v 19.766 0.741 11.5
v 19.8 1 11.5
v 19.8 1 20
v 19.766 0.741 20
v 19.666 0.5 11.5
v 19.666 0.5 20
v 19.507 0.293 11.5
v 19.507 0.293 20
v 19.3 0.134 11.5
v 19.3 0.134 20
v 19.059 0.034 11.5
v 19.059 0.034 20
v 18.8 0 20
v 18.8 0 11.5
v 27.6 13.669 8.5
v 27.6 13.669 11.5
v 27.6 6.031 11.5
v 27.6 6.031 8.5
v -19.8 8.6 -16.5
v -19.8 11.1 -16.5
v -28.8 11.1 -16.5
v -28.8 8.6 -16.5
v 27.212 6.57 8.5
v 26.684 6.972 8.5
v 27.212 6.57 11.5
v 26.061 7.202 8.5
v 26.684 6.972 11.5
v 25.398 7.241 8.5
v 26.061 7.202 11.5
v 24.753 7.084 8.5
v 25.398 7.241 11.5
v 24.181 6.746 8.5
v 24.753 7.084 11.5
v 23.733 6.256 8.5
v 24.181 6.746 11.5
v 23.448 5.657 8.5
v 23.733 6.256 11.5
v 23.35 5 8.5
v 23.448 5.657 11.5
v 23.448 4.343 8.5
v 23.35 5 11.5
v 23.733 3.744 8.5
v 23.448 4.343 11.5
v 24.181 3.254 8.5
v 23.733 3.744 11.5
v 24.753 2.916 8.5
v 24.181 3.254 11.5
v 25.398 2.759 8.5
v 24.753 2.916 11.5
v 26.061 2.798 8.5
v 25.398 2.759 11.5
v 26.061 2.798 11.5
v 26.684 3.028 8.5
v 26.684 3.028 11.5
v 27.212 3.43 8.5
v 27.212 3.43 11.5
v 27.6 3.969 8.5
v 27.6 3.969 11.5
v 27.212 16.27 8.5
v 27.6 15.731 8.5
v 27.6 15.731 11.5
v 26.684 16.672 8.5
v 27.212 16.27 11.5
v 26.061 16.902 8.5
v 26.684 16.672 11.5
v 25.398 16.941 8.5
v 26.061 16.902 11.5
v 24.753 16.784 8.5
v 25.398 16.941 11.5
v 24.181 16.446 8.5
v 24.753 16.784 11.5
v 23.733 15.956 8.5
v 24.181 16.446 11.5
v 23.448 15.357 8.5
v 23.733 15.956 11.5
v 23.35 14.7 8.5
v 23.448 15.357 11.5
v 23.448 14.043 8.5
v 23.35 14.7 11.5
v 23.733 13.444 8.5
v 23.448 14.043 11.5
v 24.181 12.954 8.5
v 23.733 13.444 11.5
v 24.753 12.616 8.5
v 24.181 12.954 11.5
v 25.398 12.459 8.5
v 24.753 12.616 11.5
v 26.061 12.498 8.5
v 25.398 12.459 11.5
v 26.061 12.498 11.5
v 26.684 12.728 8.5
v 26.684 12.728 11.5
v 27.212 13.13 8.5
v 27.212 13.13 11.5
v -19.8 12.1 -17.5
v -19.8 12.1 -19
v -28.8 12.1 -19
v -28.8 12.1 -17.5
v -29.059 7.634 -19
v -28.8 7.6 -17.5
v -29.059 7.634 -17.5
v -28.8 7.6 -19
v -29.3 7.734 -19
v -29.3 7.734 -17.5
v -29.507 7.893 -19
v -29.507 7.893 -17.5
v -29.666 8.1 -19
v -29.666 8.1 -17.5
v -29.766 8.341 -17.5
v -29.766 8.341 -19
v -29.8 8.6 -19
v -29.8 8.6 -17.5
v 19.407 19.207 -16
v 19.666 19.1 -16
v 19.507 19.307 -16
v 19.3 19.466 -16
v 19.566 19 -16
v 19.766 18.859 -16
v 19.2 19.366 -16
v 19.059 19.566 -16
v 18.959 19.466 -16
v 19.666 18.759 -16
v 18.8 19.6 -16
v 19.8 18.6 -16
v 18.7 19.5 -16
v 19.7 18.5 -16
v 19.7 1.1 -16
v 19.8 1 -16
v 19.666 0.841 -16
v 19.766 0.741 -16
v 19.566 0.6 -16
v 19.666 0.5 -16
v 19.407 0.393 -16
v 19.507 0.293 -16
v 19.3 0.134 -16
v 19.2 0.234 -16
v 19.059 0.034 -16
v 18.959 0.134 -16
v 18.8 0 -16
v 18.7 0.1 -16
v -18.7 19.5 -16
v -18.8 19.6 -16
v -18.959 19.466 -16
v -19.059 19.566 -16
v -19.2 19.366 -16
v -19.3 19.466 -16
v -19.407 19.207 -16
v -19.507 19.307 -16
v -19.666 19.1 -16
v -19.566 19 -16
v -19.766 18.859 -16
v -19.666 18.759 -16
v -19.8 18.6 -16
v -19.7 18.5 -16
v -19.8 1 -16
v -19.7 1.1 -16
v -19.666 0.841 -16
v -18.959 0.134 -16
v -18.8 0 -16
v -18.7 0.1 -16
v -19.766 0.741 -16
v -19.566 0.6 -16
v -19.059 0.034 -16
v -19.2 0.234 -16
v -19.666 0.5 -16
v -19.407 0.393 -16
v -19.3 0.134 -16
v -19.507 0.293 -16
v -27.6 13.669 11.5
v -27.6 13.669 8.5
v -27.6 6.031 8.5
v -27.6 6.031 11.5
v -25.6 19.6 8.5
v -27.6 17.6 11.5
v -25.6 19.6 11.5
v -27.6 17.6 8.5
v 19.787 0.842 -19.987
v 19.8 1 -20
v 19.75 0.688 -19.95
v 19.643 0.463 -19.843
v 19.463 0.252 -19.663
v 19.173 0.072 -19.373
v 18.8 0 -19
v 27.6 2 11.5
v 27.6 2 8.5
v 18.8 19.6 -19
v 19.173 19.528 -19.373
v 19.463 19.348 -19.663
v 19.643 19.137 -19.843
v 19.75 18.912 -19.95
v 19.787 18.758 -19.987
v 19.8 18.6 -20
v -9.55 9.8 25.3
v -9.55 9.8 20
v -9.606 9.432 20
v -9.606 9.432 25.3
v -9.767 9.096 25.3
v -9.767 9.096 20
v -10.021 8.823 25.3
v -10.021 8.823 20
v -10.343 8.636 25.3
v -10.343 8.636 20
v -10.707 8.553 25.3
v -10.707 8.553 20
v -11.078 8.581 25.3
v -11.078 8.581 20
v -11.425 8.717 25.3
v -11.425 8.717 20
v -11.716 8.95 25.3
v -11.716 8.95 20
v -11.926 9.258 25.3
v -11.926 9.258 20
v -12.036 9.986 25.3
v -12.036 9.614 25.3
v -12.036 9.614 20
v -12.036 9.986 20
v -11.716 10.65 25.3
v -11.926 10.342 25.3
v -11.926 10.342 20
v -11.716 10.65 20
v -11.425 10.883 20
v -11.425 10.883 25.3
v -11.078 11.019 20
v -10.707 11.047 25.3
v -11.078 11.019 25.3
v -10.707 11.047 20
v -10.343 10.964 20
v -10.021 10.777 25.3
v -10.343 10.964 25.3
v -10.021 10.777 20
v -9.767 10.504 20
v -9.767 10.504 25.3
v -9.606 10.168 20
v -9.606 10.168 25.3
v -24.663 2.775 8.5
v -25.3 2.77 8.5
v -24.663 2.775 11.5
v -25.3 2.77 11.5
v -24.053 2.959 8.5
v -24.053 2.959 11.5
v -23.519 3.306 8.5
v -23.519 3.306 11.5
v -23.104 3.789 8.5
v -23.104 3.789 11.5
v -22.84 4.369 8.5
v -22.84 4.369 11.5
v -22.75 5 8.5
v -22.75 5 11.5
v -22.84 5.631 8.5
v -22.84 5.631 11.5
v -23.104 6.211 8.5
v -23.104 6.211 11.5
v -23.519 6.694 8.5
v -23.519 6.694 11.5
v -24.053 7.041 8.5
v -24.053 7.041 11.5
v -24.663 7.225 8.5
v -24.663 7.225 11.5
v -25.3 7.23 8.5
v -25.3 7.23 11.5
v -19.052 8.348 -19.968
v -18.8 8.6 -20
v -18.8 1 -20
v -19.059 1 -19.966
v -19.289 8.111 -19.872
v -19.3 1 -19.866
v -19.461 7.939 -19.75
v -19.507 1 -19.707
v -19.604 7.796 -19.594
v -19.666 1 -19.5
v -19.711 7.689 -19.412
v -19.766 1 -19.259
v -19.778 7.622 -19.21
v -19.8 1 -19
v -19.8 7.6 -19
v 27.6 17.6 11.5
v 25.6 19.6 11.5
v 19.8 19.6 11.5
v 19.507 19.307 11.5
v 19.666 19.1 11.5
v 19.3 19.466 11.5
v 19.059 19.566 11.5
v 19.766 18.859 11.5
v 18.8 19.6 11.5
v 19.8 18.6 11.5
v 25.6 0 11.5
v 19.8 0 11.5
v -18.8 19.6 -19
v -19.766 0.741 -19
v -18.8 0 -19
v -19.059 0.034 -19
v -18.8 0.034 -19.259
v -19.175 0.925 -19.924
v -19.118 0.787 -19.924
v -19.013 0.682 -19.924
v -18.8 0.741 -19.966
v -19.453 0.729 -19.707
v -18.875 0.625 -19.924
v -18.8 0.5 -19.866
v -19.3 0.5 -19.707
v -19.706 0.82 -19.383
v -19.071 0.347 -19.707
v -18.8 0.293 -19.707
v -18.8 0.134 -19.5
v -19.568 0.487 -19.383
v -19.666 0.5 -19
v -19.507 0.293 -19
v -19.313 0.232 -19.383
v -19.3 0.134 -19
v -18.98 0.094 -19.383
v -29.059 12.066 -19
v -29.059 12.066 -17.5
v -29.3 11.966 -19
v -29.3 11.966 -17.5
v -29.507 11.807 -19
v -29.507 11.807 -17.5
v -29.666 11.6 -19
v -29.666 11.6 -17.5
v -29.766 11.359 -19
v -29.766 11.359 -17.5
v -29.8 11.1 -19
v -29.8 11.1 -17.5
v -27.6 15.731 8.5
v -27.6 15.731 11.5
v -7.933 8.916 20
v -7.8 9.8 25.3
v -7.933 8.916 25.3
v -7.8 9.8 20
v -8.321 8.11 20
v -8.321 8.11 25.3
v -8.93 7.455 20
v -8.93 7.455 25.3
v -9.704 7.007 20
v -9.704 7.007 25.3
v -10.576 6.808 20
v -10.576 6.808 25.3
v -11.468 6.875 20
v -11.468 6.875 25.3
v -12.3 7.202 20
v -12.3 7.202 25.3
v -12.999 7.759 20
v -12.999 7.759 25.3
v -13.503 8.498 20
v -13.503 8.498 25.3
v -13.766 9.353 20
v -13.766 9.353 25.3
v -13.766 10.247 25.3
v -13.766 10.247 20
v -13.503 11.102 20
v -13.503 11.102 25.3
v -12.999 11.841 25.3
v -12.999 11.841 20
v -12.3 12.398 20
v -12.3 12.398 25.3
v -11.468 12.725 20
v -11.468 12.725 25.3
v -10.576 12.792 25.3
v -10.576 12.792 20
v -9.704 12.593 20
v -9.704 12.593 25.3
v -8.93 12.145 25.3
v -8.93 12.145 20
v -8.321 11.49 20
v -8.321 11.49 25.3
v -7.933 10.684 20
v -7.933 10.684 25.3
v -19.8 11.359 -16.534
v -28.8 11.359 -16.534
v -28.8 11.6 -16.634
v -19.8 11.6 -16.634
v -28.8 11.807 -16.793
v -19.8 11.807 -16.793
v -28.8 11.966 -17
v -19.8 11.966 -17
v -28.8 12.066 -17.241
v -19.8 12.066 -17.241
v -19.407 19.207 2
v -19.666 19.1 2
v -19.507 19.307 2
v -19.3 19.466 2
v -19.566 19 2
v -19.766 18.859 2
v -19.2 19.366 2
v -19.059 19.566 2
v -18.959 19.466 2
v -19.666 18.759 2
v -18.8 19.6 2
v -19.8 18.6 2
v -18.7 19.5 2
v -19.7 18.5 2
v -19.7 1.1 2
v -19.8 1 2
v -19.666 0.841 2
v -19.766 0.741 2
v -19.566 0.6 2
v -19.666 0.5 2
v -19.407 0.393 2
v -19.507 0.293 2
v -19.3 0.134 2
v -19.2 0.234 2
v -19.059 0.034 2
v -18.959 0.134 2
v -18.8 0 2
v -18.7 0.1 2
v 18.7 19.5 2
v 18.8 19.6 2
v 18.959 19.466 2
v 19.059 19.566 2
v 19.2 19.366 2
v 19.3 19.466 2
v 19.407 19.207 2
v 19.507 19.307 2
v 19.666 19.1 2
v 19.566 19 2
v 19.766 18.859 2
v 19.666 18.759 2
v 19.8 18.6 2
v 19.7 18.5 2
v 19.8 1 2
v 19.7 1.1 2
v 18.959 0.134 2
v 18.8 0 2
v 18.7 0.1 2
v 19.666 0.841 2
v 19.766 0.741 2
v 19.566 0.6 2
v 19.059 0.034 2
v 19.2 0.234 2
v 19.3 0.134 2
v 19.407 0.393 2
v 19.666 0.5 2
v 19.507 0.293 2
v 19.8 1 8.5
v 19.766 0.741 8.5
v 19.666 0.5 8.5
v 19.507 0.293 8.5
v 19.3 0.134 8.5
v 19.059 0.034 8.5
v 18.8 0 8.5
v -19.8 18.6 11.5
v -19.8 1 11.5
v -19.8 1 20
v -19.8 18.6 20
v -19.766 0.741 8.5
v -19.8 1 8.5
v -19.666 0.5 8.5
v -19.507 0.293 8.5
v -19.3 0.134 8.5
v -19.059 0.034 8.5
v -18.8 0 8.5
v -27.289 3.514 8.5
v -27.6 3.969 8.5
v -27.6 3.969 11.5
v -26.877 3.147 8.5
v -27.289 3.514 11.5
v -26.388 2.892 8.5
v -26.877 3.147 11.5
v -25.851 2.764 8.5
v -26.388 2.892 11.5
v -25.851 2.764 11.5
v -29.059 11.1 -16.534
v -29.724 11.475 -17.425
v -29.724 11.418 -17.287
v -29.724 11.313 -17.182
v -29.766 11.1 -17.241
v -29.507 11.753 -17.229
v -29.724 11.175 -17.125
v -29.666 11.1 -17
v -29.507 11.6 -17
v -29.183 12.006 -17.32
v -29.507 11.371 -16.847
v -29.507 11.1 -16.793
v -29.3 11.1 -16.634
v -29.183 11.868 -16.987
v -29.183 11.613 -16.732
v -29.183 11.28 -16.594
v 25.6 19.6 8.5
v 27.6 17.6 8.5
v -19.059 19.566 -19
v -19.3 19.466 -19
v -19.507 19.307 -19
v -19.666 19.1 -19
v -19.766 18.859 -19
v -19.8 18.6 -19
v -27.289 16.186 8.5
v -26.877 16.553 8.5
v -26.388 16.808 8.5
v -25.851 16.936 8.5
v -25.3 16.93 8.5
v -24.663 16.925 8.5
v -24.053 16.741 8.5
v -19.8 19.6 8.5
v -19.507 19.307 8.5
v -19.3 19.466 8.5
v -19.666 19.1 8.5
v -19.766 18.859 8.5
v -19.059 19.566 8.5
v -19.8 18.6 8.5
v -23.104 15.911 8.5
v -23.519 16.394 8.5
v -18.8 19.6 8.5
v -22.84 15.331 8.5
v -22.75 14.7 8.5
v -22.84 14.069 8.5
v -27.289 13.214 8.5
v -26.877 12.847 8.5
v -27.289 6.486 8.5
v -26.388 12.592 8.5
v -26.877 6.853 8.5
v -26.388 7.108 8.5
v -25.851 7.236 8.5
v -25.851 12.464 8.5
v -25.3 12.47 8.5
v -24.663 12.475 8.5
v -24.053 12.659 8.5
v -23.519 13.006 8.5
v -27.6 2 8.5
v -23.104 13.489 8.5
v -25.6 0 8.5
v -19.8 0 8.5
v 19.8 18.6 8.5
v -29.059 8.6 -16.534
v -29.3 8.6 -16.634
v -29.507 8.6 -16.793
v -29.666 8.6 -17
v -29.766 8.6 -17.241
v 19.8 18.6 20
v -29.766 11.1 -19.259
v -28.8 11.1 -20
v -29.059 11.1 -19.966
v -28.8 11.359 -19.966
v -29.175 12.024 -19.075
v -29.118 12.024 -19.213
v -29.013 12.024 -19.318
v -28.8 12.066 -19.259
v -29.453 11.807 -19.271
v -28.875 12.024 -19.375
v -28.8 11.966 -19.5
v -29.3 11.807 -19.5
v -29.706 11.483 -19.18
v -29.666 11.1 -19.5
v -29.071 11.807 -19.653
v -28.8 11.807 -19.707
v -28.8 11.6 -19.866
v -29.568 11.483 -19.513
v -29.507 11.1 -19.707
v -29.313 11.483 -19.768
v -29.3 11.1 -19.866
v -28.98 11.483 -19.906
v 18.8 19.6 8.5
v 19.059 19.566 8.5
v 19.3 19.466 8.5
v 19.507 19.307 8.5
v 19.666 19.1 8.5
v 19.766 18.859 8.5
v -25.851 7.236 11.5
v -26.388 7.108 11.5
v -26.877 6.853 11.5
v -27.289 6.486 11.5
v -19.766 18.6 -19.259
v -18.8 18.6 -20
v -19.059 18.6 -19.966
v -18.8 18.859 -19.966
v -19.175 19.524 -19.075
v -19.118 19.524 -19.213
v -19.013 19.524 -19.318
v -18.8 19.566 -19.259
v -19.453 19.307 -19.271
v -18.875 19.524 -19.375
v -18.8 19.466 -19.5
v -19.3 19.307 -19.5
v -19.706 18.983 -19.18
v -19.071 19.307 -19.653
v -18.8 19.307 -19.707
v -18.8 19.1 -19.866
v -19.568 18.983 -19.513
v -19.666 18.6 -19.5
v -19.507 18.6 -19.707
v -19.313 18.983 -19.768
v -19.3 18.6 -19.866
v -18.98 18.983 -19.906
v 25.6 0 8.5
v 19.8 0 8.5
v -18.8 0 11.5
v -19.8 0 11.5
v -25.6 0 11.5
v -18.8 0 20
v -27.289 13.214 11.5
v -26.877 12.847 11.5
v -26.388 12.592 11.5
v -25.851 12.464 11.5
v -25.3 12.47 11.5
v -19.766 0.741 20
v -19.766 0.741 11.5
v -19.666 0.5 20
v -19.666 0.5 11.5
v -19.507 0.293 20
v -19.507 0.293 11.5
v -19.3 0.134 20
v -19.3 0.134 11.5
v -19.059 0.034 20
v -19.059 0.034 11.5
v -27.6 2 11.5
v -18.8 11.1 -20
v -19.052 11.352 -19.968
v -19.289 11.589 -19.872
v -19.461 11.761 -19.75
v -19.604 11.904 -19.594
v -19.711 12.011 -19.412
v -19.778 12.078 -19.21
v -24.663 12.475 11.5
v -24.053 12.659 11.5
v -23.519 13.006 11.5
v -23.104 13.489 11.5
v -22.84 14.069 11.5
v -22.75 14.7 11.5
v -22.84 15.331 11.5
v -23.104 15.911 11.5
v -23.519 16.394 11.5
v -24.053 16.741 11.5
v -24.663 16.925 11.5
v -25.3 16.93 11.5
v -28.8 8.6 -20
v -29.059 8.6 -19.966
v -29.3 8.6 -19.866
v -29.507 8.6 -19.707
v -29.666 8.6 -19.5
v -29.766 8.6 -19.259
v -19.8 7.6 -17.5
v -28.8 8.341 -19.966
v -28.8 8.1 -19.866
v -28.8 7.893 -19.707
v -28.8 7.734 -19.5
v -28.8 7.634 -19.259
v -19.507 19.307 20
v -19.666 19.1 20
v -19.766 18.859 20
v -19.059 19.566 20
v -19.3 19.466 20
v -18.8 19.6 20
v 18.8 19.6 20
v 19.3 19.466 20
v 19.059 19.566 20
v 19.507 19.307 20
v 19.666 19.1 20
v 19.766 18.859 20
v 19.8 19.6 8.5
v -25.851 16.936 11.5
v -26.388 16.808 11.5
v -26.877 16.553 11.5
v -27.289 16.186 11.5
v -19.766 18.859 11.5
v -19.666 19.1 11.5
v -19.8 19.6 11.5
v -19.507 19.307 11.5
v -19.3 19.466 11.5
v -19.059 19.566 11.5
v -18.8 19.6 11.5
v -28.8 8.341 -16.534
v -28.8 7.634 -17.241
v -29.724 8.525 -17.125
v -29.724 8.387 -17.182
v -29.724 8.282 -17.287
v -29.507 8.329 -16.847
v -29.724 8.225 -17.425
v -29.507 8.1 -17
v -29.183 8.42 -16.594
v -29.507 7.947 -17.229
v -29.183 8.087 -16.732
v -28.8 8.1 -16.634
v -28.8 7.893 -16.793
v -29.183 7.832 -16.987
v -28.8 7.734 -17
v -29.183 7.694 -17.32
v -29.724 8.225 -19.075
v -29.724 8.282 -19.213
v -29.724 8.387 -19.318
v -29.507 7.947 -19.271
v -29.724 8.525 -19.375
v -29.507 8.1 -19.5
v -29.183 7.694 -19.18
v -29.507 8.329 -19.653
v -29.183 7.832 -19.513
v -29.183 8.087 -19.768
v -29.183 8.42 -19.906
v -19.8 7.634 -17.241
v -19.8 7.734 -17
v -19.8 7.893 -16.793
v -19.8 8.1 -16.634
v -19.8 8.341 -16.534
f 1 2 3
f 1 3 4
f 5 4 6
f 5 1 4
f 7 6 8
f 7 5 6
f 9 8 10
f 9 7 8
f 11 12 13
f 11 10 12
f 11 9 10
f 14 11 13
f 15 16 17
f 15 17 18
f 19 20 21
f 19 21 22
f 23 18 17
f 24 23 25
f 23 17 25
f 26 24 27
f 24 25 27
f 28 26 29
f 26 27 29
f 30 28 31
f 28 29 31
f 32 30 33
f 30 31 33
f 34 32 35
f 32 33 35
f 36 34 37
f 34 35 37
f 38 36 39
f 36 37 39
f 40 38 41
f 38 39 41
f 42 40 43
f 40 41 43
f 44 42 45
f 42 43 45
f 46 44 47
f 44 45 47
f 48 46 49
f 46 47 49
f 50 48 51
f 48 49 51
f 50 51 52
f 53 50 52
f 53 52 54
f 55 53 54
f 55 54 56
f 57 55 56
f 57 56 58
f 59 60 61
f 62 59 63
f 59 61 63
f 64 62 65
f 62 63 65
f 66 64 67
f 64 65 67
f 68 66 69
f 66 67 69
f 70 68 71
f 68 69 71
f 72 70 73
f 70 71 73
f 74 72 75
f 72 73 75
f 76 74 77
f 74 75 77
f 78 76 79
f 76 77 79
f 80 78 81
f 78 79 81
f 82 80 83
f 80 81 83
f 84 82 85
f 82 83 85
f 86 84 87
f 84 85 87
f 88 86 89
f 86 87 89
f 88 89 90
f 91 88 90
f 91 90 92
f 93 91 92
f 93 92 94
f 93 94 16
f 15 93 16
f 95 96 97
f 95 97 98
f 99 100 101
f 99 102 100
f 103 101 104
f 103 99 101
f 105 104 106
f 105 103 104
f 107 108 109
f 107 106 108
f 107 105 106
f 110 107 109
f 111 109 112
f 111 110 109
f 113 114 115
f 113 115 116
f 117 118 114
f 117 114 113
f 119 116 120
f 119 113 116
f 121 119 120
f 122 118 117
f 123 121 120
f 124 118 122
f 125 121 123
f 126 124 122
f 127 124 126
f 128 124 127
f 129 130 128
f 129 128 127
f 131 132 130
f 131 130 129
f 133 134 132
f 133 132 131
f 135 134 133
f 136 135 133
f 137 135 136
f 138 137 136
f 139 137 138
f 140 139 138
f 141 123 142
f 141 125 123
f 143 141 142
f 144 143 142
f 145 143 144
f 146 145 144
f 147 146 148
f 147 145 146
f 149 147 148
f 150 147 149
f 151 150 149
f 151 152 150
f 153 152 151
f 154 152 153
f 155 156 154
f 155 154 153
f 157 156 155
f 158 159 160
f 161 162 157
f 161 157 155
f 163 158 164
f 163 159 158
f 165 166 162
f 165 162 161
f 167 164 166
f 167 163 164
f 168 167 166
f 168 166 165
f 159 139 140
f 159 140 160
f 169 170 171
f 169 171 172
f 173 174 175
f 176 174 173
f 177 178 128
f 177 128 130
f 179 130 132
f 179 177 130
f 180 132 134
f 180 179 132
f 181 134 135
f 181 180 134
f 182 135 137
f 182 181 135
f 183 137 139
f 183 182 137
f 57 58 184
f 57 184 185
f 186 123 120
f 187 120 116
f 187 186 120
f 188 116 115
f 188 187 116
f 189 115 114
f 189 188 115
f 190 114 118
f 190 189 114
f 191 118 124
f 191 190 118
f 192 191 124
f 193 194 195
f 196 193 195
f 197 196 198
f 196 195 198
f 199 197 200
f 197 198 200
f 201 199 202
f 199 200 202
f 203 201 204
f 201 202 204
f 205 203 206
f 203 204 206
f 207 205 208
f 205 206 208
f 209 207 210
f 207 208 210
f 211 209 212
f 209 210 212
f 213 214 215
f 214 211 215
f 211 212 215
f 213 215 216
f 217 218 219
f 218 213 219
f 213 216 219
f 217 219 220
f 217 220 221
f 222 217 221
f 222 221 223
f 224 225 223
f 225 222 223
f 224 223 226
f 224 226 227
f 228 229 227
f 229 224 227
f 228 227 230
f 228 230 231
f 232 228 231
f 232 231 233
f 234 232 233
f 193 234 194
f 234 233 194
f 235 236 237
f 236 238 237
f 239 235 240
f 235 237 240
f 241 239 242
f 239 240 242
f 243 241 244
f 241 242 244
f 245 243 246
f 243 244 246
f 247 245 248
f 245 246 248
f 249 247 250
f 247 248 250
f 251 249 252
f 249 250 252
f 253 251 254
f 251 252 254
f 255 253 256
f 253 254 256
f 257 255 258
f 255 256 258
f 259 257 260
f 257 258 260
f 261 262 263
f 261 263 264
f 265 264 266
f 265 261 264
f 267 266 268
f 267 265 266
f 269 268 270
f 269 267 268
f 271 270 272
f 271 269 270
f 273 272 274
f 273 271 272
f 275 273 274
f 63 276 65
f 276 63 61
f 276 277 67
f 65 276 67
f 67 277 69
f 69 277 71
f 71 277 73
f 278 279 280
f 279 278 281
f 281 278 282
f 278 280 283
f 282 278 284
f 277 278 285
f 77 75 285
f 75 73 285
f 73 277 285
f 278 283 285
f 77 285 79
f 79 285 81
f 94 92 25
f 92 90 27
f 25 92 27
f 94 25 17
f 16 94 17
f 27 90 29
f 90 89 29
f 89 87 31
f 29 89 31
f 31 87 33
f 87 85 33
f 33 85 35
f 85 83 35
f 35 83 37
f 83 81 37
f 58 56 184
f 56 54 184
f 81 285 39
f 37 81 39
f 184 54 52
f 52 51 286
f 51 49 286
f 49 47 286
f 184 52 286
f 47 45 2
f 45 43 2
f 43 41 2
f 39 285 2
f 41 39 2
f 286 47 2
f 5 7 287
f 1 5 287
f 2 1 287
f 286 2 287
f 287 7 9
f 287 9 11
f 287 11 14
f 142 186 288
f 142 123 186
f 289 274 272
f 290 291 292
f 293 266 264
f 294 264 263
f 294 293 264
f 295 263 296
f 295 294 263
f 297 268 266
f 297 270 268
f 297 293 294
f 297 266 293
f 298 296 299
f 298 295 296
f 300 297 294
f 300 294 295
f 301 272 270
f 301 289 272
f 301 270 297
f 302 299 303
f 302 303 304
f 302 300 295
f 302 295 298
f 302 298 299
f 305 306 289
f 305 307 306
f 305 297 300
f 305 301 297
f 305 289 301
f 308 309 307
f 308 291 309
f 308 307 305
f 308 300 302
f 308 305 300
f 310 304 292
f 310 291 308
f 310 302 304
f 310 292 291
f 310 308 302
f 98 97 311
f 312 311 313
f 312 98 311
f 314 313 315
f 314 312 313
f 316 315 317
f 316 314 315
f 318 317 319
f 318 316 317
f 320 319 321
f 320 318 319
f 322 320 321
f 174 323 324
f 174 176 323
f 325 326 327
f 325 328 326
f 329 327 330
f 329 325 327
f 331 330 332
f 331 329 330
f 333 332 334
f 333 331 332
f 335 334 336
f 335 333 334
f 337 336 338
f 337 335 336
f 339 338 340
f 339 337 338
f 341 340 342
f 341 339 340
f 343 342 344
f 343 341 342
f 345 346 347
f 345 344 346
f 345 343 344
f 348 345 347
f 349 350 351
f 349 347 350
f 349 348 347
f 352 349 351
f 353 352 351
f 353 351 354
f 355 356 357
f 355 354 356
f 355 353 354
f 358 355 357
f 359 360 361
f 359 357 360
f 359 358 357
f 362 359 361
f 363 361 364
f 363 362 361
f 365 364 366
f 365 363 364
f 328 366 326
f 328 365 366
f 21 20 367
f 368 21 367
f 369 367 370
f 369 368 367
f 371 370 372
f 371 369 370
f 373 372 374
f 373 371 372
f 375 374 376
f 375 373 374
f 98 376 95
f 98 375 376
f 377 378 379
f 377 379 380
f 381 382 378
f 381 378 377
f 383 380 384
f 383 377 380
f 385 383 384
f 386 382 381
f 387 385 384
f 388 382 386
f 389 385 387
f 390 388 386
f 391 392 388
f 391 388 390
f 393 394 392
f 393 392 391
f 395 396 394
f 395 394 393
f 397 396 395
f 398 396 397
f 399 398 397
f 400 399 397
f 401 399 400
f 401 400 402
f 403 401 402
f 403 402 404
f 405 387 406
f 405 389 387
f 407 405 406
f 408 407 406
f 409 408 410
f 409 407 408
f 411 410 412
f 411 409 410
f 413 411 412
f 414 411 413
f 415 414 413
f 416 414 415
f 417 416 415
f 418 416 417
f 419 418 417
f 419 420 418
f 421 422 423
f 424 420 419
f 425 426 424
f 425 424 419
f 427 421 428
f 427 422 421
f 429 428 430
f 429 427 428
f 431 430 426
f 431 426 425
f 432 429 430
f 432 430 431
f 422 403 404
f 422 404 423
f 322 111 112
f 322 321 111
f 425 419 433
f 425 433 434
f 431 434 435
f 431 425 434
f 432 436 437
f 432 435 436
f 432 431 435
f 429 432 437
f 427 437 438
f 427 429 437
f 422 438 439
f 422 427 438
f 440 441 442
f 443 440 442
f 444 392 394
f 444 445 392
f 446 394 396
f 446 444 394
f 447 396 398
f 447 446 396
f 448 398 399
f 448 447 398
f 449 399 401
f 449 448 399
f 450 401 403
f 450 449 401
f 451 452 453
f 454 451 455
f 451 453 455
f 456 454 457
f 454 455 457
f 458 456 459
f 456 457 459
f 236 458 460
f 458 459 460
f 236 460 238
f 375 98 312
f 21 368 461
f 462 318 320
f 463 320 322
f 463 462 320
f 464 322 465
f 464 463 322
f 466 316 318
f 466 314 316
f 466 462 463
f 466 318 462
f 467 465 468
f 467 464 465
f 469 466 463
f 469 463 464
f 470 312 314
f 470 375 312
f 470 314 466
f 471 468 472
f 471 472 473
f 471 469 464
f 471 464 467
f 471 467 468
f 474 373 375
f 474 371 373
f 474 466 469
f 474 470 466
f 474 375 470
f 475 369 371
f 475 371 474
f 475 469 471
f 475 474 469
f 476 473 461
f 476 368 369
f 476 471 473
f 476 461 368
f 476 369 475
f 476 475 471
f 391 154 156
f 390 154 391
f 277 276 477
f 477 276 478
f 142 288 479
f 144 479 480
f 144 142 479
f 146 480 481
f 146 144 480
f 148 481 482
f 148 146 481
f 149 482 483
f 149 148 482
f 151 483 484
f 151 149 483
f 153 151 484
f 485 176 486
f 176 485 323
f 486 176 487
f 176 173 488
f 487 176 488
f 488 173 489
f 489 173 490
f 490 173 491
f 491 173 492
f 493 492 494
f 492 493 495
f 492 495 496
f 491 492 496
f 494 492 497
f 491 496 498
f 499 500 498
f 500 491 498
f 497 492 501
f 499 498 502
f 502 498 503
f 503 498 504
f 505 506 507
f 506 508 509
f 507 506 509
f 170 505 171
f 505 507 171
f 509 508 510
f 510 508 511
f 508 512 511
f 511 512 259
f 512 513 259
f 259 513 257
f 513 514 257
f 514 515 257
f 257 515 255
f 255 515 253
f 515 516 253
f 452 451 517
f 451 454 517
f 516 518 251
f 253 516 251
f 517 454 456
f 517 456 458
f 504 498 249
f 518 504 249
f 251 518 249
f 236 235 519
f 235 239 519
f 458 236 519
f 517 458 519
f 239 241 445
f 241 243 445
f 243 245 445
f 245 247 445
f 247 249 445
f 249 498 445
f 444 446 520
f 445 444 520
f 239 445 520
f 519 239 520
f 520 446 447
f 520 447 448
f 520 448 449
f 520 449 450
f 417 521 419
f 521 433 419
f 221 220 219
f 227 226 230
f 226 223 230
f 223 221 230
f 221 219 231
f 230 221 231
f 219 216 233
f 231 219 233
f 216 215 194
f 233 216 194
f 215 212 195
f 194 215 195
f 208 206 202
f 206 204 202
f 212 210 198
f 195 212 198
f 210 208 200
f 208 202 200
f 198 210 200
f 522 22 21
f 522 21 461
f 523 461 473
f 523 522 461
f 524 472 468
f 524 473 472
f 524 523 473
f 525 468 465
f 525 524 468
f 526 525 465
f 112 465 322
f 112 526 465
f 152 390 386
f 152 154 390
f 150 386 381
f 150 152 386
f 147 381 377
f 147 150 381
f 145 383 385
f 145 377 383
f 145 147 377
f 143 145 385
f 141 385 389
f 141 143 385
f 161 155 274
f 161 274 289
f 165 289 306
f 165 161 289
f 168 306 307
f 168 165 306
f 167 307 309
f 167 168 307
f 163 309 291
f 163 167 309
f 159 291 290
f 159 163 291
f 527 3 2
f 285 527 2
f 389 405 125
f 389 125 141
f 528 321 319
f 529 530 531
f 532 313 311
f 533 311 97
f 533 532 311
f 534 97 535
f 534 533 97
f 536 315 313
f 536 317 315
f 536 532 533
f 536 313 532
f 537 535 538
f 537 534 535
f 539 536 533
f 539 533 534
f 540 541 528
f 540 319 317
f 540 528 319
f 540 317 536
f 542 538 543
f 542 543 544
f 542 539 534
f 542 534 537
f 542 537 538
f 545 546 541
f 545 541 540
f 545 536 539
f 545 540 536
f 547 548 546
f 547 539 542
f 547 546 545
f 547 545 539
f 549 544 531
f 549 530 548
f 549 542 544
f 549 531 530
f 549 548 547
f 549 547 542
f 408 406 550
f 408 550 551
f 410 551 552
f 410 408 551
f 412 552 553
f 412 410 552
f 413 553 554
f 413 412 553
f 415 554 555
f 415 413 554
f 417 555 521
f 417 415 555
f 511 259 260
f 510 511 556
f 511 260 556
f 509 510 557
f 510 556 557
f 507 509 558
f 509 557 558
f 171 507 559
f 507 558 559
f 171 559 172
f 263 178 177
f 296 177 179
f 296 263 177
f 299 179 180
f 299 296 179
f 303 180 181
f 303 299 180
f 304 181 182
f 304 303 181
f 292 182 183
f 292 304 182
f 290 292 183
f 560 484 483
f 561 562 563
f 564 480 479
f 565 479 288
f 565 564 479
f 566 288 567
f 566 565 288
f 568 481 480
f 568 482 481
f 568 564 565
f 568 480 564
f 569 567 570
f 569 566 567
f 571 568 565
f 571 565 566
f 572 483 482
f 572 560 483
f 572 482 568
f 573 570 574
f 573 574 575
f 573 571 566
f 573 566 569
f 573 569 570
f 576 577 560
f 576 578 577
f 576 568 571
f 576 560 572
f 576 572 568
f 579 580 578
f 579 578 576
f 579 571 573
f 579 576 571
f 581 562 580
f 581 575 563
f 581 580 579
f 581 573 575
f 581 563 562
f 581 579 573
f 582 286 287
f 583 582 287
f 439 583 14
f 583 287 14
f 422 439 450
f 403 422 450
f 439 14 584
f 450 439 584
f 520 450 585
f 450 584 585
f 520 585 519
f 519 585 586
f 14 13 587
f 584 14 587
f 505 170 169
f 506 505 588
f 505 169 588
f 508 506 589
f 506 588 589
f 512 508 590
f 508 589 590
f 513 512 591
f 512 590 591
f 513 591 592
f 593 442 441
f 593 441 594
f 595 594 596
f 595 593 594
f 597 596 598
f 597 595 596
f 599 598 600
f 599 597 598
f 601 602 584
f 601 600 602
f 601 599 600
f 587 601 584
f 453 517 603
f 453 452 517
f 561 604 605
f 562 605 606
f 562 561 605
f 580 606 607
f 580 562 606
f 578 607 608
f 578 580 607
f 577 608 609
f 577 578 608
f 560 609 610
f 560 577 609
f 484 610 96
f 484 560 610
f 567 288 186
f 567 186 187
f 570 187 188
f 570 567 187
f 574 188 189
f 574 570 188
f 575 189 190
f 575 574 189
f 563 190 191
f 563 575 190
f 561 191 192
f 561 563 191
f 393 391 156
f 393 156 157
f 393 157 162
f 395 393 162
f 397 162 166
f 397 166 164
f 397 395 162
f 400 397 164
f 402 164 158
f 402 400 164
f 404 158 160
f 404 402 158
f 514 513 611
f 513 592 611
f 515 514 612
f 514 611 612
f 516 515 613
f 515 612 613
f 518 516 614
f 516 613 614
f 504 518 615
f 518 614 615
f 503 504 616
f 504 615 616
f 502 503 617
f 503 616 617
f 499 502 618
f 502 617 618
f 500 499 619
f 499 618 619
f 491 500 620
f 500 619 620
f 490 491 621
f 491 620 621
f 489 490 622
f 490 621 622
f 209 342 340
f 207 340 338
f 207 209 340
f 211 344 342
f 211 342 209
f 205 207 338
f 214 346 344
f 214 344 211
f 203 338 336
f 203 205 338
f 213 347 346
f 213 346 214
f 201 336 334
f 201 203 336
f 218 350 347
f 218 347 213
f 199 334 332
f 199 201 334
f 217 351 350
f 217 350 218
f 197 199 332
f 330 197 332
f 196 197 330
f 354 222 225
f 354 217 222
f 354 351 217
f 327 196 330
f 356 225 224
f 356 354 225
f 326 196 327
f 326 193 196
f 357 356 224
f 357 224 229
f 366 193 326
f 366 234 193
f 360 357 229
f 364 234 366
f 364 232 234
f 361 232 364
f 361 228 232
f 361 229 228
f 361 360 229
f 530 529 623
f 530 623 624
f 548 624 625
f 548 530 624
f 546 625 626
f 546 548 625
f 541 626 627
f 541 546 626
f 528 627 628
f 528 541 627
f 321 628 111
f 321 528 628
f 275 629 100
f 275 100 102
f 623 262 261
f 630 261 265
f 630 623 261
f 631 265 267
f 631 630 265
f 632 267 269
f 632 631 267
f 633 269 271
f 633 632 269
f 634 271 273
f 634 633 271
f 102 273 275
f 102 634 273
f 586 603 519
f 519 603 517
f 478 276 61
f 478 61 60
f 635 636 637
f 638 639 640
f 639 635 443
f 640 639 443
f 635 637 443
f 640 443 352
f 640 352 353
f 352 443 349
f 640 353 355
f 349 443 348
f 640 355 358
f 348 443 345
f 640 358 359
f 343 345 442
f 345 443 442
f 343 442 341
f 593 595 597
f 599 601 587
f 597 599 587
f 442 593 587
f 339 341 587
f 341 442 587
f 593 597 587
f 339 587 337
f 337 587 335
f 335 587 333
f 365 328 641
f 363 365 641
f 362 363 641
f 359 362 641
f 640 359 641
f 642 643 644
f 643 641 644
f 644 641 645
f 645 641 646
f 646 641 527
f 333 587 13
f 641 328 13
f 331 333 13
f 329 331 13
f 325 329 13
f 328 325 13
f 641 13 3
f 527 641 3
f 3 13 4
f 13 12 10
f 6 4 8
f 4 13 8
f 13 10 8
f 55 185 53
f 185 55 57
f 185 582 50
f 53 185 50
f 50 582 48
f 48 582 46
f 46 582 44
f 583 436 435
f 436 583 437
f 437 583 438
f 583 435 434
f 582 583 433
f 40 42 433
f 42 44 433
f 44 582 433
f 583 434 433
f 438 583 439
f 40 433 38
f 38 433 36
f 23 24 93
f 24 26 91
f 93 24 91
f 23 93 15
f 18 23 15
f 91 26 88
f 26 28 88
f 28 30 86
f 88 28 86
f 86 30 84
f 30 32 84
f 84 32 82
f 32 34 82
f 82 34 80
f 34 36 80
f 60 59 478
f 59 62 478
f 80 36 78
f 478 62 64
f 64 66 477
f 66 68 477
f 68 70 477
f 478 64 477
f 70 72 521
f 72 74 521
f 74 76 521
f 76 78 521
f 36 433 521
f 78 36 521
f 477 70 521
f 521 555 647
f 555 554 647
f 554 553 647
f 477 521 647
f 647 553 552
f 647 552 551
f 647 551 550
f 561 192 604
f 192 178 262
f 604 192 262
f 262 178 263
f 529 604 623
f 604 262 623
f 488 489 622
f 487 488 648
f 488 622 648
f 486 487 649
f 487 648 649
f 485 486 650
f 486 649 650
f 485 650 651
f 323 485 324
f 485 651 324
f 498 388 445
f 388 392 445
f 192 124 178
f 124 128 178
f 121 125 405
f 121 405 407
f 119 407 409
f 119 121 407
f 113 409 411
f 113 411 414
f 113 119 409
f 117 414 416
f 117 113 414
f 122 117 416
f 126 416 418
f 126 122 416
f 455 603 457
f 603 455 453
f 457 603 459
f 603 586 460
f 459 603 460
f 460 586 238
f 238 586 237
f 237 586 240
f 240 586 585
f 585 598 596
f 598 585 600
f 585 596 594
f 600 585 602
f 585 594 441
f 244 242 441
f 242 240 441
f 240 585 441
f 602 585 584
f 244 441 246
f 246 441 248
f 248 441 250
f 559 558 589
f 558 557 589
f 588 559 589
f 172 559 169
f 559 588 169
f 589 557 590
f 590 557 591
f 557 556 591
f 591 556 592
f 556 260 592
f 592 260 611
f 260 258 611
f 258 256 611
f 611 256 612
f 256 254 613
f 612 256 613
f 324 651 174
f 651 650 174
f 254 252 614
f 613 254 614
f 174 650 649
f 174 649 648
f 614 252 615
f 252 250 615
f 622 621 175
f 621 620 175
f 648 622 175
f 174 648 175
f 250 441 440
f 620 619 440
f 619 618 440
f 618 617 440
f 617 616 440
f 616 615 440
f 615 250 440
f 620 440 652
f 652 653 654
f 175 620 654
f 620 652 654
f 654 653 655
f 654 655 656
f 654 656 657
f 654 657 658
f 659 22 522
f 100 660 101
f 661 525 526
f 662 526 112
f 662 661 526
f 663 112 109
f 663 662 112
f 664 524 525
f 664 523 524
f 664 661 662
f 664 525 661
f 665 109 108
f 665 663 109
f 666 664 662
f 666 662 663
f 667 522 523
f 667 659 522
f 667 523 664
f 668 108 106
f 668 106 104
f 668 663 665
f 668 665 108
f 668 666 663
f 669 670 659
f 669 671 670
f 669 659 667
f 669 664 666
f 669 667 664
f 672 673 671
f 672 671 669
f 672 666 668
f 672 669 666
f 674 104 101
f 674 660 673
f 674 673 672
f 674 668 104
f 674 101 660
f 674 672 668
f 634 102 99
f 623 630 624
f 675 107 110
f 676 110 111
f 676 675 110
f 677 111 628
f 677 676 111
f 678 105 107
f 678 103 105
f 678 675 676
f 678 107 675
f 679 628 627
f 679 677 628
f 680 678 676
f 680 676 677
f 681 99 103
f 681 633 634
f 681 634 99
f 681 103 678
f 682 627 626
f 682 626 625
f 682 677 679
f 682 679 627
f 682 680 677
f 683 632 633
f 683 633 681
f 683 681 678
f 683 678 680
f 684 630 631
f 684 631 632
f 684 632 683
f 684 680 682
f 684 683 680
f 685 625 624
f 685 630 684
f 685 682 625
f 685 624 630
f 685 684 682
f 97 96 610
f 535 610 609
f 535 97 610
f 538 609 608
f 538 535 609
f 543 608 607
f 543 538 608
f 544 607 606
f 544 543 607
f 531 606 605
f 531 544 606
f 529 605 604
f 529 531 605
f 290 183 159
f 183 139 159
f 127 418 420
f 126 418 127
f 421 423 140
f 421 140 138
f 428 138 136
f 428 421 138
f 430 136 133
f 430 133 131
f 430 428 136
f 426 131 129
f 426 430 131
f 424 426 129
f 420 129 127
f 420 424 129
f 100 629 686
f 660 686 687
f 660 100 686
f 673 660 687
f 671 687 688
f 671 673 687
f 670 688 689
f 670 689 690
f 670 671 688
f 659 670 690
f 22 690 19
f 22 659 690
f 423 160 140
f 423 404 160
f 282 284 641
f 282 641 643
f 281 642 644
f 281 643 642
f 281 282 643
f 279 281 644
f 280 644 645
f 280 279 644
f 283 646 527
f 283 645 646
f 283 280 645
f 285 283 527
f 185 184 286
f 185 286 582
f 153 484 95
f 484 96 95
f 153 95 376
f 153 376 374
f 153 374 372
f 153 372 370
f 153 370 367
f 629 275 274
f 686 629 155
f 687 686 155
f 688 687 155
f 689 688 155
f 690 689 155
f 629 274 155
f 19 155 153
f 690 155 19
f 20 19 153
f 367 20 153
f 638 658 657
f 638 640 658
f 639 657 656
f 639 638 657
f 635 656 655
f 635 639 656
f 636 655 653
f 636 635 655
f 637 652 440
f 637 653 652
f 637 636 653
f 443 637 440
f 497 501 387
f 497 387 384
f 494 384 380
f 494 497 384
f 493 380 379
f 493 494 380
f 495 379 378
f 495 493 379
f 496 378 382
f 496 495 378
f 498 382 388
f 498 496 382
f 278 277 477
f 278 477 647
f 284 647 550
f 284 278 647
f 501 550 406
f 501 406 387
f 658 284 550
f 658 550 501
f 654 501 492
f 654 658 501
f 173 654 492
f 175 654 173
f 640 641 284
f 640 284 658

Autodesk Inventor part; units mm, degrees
ref_plane "YZ Plane" through (0, 0, 0) normal (1, 0, 0) x (0, 1, 0)
sketch "Sketch1" plane through (0, 0, 0) normal (0, 1, 0) x (-1, 0, 0)
  line L0 (-19.8, -20) -> (19.8, -20)
  line L1 (19.8, -20) -> (19.8, 20)
  line L2 (19.8, 20) -> (-19.8, 20)
  line L3 (-19.8, 20) -> (-19.8, -20)
  line L4 (-19.8, -20) -> (19.8, 20) construction
  line L5 (19.8, -20) -> (-19.8, 20) construction
  point P0 (0, 0)
  dimension "d0" = 39.6
  dimension "d1" = 40
extrude "Extrusion1" add sketch "Sketch1" along normal blind 19.6
sketch "Sketch2" plane through (-19.8, 0, -20) normal (-1, 0, 0) x (0, 0, 1)
  line L0 (31.5, 19.6) -> (28.5, 19.6)
  line L1 (28.5, 19.6) -> (28.5, 0)
  line L2 (28.5, 0) -> (31.5, 0)
  line L3 (31.5, 0) -> (31.5, 19.6)
  line L4 (0, 0) -> (0, 19.6) projected
  line L5 (0, 0) -> (40, 0) projected
  line L6 (0, 19.6) -> (40, 19.6) projected
  point P0 (20, 0)
  dimension "d4" = 28.5
  dimension "d5" = 3
  dimension "d6" = 0
  dimension "d7" = 0
extrude "Extrusion2" add sketch "Sketch2" along normal blind 7.8 contours L3 L2 L1 L0
sketch "Sketch4" plane through (-19.8, 0, 20) normal (0, 0, 1) x (1, 0, 0)
  circle A0 centre (9, 9.8) radius 3
  line L0 (0, 0) -> (39.6, 0) projected
  line L1 (0, 19.6) -> (39.6, 19.6) projected
  circle A1 centre (9, 9.8) radius 1.25
  line L2 (0, 0) -> (0, 19.6) projected
  line L3 (12, 3.6087) -> (12, 15.8306)
  point P0 (19.8, 0)
  dimension "d12" = 9.8
  dimension "d13" = 19.6
  dimension "d14" = 6
  dimension "d15" = 2.5
  dimension "d35" = 9
  dimension "d36" = 12
extrude "Extrusion4" add sketch "Sketch4" along normal blind 5.3
ref_plane "Work Plane1" through (19.8, 0, 11.5) normal (0, 0, 1) x (1, 0, 0)
sketch "Sketch5" plane through (19.8, 0, 11.5) normal (0, 0, 1) x (1, 0, 0)
  circle A0 centre (5.2, 5) radius 2.25
  line L0 (-47.4, 0) -> (-47.4, 19.7) projected
  line L1 (6.2685, 9.85) -> (-43.2578, 9.85)
  line L2 (-20.1, 2.75) -> (-20.1, 17.4196)
  circle A1 centre (5.2, 14.7) radius 2.25
  circle A2 centre (-45.4, 5) radius 2.25
  circle A3 centre (-45.4, 14.7) radius 2.25
  line L3 (0, 0) -> (0, 19.6) projected
  line L4 (-39.6, 0) -> (0, 0) projected
  point P0 (-19.8, 0)
  dimension "d18" = 4.5
  dimension "d41" = 5.2
  dimension "d42" = 5
  dimension "d43" = 9.7
extrude "Extrusion5" cut sketch "Sketch5" against normal blind 5
chamfer "Chamfer1" distance 2 angle 45 2 edges at (-27.6, 19.6, 10) (-27.6, 0, 10)
mirror "Mirror1" about plane through (0, 0, 0) normal (1, 0, 0) of "Extrusion2"
chamfer "Chamfer3" distance 2 angle 45 2 edges at (27.6, 19.6, 10) (27.6, 0, 10)
mirror "Mirror2" about plane through (0, 0, 0) normal (1, 0, 0) of "Extrusion5"
sketch "Sketch7" plane through (-19.8, 0, -20) normal (-1, 0, 0) x (0, 0, 1)
  line L0 (0, 0) -> (0, 19.6) projected
  line L1 (0, 12.1) -> (3.5, 12.1)
  line L2 (3.5, 12.1) -> (3.5, 7.6)
  line L3 (3.5, 7.6) -> (0, 7.6)
  line L4 (0, 7.6) -> (0, 12.1)
  line L5 (0, 0) -> (28.5, 0) projected
  line L6 (28.5, 19.7) -> (0, 19.7) projected
  line L7 (13.8096, 9.85) -> (-5.6461, 9.85) construction
  point P0 (20, 0)
  point P1 (0, 18.7)
  dimension "d44" = 4.5
  dimension "d45" = 19.7
  dimension "d46" = 9.85
  dimension "d47" = 3.5
extrude "Extrusion6" add sketch "Sketch7" along normal blind 10
sketch "Sketch8" plane through (0, 0, 0) normal (0, -1, 0) x (1, 0, 0)
  line L0 (-19.8, 2) -> (19.8, 2)
  line L1 (19.8, 2) -> (19.8, -16)
  line L2 (19.8, -16) -> (-19.8, -16)
  line L3 (-19.8, -16) -> (-19.8, 2)
  line L4 (19.8, -20) -> (-19.8, -20) projected
  line L5 (-19.8, -20) -> (-19.8, 8.5) projected
  line L6 (19.8, 8.5) -> (19.8, -20) projected
  point P0 (0, 0)
  dimension "d52" = 18
  dimension "d55" = 4
extrude "Extrusion7" cut sketch "Sketch8" against normal blind 0.1 contours L0 L1 L2 L3
ref_plane "Work Plane2" through (0, 9.8, 0) normal (0, -1, 0) x (1, 0, 0)
mirror "Mirror3" about plane through (0, 9.8, 0) normal (0, -1, 0) of "Extrusion7"
sketch "Sketch9" plane through (-19.8, 0, 8.5) normal (-1, 0, 0) x (0, 0, 1)
  line L0 (-6.5, 19.6) -> (-6.5, 19.5) projected
  line L1 (-24.5, 0.1) -> (-6.5, 0.1) projected
  line L2 (-6.5, 19.5) -> (-24.5, 19.5)
  line L3 (-24.5, 19.5) -> (-24.5, 0.1)
  line L4 (-24.5, 0.1) -> (-6.5, 0.1)
  line L5 (-6.5, 0.1) -> (-6.5, 19.5)
  point P0 (-8.5, 0)
extrude "Extrusion8" cut sketch "Sketch9" against normal blind 0.1
mirror "Mirror4" about plane through (0, 0, 0) normal (1, 0, 0) of "Extrusion8"
fillet "Fillet5" radius 1 28 edges at (-19.8, 0, 5.25) (-19.7, 0.1, -7) (-19.8, 0, 15.75) (-19.8, 0, -18) (-19.8, 3.8, -20) (0, 0, -20) (-19.8, 15.85, -20) (-24.8, 12.1, -16.5) (-24.8, 7.6, -16.5) (-24.8, 7.6, -20) (-29.8, 9.85, -20) (-29.8, 12.1, -18.25) (-24.8, 12.1, -20) (-29.8, 9.85, -16.5) (-29.8, 7.6, -18.25) (-19.8, 19.6, -18) (-19.7, 19.5, -7) (-19.8, 19.6, 5.25) (-19.8, 19.6, 15.75) (0, 19.6, -20) (19.8, 19.6, -18) (19.7, 19.5, -7) (19.8, 19.6, 5.25) (19.8, 19.6, 15.75) (19.8, 0, -18) (19.7, 0.1, -7) (19.8, 0, 5.25) (19.8, 0, 15.75)
equation "\"d12\" = 0.5 * d13"
equation "\"d46\" = 0.5 * d45"
properties part number "Trackstar_Servo_TS411MG"
